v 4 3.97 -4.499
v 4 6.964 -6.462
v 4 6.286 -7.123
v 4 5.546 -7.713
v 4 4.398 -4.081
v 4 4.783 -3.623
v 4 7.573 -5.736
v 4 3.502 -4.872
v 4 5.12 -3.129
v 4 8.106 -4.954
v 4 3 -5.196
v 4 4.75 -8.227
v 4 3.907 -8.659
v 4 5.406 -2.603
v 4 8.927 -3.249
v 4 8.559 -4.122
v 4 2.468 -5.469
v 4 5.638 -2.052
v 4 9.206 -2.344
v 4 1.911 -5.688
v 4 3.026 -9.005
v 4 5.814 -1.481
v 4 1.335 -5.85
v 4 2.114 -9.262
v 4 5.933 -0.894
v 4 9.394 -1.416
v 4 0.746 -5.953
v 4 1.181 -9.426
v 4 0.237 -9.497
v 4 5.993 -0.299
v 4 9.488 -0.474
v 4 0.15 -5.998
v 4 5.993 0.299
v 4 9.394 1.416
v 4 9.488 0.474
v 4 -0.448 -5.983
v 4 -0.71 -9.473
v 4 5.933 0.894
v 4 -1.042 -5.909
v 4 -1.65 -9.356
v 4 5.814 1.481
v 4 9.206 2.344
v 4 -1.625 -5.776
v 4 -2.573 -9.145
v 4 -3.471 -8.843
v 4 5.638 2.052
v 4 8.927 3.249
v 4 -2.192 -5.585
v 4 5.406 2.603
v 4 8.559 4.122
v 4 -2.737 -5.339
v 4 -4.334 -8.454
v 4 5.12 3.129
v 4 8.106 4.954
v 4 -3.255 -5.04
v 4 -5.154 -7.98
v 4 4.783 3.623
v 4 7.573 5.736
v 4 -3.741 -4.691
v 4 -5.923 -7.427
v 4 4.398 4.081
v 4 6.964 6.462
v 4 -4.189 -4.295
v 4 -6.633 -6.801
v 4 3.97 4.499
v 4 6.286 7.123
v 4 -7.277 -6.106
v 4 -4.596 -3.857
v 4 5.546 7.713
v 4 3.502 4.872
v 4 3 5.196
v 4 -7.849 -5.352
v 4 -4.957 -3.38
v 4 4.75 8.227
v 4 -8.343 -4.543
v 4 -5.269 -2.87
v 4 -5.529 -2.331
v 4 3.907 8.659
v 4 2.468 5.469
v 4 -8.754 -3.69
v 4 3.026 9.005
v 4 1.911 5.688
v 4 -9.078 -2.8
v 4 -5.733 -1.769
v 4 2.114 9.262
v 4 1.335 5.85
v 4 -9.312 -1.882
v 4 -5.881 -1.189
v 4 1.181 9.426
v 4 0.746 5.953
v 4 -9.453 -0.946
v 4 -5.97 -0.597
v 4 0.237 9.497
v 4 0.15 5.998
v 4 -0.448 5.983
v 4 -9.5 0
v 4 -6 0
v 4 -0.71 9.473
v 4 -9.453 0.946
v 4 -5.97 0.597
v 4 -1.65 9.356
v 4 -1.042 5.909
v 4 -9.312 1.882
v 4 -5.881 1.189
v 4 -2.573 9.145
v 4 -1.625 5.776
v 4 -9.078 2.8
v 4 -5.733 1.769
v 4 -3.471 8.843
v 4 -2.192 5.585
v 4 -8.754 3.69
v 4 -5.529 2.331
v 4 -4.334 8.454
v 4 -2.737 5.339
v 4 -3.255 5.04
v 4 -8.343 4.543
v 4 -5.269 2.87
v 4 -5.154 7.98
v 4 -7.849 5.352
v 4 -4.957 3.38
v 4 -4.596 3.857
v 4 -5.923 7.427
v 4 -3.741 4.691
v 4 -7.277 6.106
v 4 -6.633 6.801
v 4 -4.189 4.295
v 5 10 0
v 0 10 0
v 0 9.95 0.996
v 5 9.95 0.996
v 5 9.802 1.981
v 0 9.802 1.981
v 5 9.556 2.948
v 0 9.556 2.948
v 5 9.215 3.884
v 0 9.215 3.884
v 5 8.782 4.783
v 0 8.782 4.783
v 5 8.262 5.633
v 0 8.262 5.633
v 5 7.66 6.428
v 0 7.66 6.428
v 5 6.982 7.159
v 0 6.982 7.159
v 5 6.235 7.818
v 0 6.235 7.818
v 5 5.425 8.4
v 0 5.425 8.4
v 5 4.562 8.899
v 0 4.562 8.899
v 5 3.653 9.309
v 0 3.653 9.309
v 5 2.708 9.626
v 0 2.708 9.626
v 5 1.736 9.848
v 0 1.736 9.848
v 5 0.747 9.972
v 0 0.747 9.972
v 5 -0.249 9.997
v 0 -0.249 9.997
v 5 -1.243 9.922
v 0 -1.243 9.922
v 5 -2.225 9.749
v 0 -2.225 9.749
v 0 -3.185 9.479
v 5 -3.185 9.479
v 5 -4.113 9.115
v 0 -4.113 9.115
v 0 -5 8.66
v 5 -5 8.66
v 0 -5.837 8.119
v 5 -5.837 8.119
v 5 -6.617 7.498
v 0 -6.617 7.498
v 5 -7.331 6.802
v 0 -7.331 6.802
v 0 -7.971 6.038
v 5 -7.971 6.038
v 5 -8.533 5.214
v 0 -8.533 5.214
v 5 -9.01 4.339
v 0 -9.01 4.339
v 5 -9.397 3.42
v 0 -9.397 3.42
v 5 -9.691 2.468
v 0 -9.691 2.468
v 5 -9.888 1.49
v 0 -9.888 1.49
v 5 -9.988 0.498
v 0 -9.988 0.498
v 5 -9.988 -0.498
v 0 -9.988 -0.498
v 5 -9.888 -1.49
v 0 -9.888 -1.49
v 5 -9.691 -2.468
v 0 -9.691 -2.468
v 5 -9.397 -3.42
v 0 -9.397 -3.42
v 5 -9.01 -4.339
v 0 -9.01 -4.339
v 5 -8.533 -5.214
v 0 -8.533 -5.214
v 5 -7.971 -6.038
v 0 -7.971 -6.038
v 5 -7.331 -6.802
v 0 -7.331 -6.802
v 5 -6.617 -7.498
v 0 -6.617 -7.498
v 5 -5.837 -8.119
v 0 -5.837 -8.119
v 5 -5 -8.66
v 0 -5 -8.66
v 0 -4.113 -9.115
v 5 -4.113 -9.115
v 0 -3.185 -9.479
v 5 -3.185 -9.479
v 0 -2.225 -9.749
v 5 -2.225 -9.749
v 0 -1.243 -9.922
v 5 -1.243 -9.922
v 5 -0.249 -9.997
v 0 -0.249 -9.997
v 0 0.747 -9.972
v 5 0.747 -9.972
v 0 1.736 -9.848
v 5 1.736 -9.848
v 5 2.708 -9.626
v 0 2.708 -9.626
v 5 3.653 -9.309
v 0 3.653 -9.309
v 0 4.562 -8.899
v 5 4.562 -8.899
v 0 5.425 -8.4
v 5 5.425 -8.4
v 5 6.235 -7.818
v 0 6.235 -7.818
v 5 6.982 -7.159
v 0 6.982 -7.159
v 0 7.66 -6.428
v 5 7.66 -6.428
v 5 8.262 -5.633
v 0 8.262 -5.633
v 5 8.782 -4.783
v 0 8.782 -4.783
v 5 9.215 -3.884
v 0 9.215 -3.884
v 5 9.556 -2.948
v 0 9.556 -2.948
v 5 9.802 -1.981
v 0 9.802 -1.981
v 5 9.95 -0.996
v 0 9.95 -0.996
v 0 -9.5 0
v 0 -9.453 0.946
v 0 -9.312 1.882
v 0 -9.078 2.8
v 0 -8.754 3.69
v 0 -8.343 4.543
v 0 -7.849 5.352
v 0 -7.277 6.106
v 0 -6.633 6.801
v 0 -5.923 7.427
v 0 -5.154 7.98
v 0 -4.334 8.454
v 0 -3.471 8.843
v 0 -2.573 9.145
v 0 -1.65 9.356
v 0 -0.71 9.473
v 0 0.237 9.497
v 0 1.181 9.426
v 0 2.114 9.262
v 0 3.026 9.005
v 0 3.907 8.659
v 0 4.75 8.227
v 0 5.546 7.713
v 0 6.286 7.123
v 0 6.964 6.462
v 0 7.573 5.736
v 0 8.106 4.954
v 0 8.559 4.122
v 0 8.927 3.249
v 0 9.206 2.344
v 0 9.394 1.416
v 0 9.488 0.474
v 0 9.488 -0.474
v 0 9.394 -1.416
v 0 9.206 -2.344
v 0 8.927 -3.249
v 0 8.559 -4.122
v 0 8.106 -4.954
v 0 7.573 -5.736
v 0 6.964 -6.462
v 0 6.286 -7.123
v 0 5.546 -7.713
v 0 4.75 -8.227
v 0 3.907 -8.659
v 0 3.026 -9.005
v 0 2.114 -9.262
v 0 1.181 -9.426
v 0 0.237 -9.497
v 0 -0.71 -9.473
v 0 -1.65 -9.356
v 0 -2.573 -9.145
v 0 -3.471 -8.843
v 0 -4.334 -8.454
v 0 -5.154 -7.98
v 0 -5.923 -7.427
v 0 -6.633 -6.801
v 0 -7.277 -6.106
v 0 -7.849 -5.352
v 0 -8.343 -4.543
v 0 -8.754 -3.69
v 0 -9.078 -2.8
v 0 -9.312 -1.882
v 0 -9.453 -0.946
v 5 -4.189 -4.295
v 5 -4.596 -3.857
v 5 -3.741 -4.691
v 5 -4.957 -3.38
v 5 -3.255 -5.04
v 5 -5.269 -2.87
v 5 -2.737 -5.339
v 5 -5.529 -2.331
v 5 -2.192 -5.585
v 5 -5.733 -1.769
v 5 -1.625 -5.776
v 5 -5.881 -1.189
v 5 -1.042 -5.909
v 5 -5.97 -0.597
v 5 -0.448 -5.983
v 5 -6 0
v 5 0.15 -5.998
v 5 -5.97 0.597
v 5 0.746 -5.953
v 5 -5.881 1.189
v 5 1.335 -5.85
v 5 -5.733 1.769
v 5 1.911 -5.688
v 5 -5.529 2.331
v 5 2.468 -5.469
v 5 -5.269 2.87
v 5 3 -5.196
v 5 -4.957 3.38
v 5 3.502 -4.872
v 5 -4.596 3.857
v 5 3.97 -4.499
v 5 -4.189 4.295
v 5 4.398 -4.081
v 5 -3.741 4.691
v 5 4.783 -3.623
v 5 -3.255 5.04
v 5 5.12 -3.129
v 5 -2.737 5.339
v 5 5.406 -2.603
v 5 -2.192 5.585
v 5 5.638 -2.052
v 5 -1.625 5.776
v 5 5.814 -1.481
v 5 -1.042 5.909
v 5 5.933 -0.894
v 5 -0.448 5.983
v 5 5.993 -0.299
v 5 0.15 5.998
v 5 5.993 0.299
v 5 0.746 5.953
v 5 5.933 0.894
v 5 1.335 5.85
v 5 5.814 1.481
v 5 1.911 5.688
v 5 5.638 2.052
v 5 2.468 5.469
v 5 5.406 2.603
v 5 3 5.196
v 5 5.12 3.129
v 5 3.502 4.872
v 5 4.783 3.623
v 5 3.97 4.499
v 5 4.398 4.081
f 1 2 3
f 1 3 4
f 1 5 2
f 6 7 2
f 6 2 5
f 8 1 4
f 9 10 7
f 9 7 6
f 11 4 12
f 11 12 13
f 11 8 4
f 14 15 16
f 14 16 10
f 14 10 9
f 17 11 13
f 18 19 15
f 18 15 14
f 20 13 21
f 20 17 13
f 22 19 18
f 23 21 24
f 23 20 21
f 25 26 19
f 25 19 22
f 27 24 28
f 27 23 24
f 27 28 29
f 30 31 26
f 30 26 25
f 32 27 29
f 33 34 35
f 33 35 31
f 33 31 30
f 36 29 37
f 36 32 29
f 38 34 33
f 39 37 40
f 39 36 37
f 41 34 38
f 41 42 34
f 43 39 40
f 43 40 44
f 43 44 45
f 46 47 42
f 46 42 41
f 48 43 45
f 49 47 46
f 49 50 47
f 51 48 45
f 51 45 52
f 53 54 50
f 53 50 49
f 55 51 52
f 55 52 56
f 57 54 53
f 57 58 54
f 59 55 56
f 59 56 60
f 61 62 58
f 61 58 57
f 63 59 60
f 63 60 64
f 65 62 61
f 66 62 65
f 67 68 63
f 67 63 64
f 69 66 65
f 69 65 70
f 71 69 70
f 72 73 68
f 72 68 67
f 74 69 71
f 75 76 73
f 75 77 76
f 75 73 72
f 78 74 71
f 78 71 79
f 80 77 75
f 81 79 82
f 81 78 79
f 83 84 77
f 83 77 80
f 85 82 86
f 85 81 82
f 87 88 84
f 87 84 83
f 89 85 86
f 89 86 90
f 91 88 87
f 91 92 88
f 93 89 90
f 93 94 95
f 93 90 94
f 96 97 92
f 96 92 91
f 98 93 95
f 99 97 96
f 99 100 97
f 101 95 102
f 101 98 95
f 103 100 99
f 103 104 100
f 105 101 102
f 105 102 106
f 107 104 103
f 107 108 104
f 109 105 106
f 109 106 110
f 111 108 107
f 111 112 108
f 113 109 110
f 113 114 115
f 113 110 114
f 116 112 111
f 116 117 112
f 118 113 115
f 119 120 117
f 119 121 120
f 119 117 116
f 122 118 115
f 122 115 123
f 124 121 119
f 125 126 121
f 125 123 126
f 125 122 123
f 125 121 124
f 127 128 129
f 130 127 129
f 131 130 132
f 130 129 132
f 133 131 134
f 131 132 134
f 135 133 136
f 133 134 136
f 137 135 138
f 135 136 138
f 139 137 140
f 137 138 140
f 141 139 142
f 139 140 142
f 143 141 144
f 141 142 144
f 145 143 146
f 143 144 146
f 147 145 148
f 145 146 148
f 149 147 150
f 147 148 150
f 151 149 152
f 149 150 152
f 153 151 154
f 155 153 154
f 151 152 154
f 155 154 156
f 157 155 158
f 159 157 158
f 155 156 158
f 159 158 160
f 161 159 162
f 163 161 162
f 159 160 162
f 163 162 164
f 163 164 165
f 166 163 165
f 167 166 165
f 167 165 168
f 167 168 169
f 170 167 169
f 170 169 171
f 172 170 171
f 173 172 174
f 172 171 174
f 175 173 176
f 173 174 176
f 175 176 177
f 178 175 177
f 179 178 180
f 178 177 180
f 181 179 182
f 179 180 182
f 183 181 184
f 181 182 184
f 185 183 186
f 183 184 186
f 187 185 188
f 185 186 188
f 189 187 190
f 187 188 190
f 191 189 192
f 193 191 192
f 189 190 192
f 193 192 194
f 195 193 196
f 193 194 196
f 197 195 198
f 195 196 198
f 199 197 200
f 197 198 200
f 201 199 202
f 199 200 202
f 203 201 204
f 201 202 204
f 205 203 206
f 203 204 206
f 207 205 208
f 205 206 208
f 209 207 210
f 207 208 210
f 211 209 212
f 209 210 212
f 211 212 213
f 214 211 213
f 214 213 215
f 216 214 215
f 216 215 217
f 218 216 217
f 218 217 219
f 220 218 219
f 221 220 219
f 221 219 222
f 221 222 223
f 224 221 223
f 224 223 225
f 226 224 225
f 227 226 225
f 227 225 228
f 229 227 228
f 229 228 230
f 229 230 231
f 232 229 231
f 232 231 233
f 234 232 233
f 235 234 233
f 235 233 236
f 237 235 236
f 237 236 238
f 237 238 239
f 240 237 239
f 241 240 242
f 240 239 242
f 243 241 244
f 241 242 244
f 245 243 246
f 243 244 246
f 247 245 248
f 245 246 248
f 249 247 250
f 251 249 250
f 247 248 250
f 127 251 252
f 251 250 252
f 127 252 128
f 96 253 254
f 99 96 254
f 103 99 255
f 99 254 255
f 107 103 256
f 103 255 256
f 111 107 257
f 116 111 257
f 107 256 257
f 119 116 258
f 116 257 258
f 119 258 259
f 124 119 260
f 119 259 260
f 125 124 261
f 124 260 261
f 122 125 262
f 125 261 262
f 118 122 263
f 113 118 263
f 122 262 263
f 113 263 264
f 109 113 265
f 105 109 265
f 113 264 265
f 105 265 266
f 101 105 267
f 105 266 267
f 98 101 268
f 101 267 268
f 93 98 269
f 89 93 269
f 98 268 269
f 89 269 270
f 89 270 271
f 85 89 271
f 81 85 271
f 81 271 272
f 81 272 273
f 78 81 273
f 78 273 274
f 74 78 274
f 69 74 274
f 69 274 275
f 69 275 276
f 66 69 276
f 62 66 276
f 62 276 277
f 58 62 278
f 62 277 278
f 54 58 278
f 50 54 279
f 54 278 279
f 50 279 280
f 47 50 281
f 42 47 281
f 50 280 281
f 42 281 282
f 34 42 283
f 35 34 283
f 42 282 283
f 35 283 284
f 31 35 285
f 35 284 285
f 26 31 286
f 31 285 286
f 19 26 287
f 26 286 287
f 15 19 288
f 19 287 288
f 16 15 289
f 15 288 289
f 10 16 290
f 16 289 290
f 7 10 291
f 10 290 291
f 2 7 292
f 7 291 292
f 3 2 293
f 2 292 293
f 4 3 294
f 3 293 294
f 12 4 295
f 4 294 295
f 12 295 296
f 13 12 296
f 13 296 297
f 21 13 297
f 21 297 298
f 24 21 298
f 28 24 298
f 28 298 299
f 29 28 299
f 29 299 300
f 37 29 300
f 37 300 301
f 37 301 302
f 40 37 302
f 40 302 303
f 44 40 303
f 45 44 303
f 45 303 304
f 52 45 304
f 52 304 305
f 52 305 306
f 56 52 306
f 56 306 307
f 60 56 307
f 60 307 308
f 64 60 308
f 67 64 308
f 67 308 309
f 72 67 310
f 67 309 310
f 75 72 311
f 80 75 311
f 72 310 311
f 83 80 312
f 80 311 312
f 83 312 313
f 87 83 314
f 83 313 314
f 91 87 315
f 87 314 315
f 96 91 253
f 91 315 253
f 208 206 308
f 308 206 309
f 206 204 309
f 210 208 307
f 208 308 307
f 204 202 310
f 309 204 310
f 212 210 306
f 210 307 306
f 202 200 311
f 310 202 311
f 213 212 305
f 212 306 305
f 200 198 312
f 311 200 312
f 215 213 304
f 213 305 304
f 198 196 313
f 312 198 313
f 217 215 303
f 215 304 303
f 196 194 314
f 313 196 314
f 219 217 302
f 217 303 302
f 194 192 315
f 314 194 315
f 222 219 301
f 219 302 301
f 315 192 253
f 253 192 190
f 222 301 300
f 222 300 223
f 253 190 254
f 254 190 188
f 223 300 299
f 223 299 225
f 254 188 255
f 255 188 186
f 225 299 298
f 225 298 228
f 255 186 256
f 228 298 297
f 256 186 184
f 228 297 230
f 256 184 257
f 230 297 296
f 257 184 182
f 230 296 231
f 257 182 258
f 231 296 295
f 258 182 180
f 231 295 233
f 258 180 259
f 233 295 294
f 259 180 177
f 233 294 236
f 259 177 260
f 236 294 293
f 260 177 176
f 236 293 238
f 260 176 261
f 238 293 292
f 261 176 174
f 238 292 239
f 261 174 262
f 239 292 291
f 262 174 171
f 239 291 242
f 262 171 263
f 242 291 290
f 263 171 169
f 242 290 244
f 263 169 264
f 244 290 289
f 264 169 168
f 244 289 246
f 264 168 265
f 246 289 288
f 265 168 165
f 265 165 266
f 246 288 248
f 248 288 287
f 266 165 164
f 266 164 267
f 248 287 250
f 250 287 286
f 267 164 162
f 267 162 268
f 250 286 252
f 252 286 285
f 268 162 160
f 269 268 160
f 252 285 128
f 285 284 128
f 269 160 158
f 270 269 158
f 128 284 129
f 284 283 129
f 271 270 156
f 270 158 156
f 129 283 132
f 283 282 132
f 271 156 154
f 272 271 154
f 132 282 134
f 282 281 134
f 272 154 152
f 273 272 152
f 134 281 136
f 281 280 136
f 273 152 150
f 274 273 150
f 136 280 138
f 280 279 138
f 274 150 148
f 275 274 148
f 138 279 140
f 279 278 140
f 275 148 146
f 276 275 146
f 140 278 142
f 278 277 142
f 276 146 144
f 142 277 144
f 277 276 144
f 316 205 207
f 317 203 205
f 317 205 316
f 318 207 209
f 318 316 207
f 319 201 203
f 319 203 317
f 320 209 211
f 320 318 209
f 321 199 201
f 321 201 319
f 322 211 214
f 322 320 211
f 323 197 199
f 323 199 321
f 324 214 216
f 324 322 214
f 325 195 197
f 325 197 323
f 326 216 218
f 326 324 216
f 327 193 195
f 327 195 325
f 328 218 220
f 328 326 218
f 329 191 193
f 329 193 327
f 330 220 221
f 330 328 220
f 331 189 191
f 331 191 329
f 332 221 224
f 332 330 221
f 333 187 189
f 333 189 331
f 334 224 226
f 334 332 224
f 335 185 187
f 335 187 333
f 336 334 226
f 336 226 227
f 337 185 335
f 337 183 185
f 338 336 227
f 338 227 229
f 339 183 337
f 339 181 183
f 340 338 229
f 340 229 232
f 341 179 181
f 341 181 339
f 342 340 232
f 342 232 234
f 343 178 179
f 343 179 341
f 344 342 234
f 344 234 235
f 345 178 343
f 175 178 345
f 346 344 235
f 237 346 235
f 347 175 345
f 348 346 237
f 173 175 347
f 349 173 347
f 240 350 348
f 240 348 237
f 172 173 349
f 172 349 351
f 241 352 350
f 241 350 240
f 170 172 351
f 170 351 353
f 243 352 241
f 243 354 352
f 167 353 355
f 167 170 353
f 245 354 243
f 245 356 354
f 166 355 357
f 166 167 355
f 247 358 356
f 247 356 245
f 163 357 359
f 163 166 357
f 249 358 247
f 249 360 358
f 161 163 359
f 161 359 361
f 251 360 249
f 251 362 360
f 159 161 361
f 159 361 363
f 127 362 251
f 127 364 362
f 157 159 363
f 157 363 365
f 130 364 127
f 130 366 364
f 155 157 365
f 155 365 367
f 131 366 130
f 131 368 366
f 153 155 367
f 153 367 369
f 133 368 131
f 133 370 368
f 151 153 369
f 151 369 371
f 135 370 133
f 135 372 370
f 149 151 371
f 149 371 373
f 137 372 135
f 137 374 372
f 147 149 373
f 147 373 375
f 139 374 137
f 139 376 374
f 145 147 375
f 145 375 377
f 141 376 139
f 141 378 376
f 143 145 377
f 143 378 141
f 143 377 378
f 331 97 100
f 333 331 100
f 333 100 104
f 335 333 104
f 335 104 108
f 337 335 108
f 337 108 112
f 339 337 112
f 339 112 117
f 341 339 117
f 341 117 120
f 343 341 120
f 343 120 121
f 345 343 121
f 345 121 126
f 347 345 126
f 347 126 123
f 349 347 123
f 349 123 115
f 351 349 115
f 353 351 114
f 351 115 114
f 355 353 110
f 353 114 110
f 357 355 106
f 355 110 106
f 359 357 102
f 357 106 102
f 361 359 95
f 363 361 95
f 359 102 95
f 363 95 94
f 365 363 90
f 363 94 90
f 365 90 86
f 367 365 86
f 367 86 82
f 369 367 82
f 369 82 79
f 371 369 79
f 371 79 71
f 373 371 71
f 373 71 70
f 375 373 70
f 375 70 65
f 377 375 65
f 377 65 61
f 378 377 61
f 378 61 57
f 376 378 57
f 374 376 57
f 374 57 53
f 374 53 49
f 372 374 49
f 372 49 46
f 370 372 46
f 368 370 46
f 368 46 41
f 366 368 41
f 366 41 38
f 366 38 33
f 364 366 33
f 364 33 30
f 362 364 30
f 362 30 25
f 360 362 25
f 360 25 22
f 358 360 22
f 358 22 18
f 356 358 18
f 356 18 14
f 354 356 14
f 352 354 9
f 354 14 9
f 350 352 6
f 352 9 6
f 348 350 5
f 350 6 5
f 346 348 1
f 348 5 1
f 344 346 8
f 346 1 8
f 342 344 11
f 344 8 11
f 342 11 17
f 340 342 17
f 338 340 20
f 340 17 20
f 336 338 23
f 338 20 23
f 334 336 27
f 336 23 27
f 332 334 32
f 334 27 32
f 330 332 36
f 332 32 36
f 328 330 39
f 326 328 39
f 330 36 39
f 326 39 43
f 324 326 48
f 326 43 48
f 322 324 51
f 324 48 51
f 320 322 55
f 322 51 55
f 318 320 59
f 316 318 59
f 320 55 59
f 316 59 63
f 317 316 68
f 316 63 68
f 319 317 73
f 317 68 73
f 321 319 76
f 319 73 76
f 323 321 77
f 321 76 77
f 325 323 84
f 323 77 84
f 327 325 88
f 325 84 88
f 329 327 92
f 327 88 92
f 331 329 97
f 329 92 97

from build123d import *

# Parameters (mm, degrees)
F0_R     = 10
F1_DEPTH = 5
F2_R     = 9.5
F3_DEPTH = 4
F5_D     = 12


with BuildPart() as f1:
    # F0 (on Right) → F1 (new body)
    with BuildSketch(Plane.YZ):
        Circle(F0_R)
    extrude(amount=F1_DEPTH)

    # F2 (on face) → F3 (cut)
    with BuildSketch(Plane(origin=(0, 0, 0), x_dir=(0, -1, 0), z_dir=(-1, 0, 0))):
        Circle(F2_R)
    extrude(amount=-F3_DEPTH, mode=Mode.SUBTRACT)

    # F5 (through all)
    with Locations(Plane.YZ.offset(5)):
        with Locations((0, 0)):
            Hole(F5_D / 2)


solid = f1.part
